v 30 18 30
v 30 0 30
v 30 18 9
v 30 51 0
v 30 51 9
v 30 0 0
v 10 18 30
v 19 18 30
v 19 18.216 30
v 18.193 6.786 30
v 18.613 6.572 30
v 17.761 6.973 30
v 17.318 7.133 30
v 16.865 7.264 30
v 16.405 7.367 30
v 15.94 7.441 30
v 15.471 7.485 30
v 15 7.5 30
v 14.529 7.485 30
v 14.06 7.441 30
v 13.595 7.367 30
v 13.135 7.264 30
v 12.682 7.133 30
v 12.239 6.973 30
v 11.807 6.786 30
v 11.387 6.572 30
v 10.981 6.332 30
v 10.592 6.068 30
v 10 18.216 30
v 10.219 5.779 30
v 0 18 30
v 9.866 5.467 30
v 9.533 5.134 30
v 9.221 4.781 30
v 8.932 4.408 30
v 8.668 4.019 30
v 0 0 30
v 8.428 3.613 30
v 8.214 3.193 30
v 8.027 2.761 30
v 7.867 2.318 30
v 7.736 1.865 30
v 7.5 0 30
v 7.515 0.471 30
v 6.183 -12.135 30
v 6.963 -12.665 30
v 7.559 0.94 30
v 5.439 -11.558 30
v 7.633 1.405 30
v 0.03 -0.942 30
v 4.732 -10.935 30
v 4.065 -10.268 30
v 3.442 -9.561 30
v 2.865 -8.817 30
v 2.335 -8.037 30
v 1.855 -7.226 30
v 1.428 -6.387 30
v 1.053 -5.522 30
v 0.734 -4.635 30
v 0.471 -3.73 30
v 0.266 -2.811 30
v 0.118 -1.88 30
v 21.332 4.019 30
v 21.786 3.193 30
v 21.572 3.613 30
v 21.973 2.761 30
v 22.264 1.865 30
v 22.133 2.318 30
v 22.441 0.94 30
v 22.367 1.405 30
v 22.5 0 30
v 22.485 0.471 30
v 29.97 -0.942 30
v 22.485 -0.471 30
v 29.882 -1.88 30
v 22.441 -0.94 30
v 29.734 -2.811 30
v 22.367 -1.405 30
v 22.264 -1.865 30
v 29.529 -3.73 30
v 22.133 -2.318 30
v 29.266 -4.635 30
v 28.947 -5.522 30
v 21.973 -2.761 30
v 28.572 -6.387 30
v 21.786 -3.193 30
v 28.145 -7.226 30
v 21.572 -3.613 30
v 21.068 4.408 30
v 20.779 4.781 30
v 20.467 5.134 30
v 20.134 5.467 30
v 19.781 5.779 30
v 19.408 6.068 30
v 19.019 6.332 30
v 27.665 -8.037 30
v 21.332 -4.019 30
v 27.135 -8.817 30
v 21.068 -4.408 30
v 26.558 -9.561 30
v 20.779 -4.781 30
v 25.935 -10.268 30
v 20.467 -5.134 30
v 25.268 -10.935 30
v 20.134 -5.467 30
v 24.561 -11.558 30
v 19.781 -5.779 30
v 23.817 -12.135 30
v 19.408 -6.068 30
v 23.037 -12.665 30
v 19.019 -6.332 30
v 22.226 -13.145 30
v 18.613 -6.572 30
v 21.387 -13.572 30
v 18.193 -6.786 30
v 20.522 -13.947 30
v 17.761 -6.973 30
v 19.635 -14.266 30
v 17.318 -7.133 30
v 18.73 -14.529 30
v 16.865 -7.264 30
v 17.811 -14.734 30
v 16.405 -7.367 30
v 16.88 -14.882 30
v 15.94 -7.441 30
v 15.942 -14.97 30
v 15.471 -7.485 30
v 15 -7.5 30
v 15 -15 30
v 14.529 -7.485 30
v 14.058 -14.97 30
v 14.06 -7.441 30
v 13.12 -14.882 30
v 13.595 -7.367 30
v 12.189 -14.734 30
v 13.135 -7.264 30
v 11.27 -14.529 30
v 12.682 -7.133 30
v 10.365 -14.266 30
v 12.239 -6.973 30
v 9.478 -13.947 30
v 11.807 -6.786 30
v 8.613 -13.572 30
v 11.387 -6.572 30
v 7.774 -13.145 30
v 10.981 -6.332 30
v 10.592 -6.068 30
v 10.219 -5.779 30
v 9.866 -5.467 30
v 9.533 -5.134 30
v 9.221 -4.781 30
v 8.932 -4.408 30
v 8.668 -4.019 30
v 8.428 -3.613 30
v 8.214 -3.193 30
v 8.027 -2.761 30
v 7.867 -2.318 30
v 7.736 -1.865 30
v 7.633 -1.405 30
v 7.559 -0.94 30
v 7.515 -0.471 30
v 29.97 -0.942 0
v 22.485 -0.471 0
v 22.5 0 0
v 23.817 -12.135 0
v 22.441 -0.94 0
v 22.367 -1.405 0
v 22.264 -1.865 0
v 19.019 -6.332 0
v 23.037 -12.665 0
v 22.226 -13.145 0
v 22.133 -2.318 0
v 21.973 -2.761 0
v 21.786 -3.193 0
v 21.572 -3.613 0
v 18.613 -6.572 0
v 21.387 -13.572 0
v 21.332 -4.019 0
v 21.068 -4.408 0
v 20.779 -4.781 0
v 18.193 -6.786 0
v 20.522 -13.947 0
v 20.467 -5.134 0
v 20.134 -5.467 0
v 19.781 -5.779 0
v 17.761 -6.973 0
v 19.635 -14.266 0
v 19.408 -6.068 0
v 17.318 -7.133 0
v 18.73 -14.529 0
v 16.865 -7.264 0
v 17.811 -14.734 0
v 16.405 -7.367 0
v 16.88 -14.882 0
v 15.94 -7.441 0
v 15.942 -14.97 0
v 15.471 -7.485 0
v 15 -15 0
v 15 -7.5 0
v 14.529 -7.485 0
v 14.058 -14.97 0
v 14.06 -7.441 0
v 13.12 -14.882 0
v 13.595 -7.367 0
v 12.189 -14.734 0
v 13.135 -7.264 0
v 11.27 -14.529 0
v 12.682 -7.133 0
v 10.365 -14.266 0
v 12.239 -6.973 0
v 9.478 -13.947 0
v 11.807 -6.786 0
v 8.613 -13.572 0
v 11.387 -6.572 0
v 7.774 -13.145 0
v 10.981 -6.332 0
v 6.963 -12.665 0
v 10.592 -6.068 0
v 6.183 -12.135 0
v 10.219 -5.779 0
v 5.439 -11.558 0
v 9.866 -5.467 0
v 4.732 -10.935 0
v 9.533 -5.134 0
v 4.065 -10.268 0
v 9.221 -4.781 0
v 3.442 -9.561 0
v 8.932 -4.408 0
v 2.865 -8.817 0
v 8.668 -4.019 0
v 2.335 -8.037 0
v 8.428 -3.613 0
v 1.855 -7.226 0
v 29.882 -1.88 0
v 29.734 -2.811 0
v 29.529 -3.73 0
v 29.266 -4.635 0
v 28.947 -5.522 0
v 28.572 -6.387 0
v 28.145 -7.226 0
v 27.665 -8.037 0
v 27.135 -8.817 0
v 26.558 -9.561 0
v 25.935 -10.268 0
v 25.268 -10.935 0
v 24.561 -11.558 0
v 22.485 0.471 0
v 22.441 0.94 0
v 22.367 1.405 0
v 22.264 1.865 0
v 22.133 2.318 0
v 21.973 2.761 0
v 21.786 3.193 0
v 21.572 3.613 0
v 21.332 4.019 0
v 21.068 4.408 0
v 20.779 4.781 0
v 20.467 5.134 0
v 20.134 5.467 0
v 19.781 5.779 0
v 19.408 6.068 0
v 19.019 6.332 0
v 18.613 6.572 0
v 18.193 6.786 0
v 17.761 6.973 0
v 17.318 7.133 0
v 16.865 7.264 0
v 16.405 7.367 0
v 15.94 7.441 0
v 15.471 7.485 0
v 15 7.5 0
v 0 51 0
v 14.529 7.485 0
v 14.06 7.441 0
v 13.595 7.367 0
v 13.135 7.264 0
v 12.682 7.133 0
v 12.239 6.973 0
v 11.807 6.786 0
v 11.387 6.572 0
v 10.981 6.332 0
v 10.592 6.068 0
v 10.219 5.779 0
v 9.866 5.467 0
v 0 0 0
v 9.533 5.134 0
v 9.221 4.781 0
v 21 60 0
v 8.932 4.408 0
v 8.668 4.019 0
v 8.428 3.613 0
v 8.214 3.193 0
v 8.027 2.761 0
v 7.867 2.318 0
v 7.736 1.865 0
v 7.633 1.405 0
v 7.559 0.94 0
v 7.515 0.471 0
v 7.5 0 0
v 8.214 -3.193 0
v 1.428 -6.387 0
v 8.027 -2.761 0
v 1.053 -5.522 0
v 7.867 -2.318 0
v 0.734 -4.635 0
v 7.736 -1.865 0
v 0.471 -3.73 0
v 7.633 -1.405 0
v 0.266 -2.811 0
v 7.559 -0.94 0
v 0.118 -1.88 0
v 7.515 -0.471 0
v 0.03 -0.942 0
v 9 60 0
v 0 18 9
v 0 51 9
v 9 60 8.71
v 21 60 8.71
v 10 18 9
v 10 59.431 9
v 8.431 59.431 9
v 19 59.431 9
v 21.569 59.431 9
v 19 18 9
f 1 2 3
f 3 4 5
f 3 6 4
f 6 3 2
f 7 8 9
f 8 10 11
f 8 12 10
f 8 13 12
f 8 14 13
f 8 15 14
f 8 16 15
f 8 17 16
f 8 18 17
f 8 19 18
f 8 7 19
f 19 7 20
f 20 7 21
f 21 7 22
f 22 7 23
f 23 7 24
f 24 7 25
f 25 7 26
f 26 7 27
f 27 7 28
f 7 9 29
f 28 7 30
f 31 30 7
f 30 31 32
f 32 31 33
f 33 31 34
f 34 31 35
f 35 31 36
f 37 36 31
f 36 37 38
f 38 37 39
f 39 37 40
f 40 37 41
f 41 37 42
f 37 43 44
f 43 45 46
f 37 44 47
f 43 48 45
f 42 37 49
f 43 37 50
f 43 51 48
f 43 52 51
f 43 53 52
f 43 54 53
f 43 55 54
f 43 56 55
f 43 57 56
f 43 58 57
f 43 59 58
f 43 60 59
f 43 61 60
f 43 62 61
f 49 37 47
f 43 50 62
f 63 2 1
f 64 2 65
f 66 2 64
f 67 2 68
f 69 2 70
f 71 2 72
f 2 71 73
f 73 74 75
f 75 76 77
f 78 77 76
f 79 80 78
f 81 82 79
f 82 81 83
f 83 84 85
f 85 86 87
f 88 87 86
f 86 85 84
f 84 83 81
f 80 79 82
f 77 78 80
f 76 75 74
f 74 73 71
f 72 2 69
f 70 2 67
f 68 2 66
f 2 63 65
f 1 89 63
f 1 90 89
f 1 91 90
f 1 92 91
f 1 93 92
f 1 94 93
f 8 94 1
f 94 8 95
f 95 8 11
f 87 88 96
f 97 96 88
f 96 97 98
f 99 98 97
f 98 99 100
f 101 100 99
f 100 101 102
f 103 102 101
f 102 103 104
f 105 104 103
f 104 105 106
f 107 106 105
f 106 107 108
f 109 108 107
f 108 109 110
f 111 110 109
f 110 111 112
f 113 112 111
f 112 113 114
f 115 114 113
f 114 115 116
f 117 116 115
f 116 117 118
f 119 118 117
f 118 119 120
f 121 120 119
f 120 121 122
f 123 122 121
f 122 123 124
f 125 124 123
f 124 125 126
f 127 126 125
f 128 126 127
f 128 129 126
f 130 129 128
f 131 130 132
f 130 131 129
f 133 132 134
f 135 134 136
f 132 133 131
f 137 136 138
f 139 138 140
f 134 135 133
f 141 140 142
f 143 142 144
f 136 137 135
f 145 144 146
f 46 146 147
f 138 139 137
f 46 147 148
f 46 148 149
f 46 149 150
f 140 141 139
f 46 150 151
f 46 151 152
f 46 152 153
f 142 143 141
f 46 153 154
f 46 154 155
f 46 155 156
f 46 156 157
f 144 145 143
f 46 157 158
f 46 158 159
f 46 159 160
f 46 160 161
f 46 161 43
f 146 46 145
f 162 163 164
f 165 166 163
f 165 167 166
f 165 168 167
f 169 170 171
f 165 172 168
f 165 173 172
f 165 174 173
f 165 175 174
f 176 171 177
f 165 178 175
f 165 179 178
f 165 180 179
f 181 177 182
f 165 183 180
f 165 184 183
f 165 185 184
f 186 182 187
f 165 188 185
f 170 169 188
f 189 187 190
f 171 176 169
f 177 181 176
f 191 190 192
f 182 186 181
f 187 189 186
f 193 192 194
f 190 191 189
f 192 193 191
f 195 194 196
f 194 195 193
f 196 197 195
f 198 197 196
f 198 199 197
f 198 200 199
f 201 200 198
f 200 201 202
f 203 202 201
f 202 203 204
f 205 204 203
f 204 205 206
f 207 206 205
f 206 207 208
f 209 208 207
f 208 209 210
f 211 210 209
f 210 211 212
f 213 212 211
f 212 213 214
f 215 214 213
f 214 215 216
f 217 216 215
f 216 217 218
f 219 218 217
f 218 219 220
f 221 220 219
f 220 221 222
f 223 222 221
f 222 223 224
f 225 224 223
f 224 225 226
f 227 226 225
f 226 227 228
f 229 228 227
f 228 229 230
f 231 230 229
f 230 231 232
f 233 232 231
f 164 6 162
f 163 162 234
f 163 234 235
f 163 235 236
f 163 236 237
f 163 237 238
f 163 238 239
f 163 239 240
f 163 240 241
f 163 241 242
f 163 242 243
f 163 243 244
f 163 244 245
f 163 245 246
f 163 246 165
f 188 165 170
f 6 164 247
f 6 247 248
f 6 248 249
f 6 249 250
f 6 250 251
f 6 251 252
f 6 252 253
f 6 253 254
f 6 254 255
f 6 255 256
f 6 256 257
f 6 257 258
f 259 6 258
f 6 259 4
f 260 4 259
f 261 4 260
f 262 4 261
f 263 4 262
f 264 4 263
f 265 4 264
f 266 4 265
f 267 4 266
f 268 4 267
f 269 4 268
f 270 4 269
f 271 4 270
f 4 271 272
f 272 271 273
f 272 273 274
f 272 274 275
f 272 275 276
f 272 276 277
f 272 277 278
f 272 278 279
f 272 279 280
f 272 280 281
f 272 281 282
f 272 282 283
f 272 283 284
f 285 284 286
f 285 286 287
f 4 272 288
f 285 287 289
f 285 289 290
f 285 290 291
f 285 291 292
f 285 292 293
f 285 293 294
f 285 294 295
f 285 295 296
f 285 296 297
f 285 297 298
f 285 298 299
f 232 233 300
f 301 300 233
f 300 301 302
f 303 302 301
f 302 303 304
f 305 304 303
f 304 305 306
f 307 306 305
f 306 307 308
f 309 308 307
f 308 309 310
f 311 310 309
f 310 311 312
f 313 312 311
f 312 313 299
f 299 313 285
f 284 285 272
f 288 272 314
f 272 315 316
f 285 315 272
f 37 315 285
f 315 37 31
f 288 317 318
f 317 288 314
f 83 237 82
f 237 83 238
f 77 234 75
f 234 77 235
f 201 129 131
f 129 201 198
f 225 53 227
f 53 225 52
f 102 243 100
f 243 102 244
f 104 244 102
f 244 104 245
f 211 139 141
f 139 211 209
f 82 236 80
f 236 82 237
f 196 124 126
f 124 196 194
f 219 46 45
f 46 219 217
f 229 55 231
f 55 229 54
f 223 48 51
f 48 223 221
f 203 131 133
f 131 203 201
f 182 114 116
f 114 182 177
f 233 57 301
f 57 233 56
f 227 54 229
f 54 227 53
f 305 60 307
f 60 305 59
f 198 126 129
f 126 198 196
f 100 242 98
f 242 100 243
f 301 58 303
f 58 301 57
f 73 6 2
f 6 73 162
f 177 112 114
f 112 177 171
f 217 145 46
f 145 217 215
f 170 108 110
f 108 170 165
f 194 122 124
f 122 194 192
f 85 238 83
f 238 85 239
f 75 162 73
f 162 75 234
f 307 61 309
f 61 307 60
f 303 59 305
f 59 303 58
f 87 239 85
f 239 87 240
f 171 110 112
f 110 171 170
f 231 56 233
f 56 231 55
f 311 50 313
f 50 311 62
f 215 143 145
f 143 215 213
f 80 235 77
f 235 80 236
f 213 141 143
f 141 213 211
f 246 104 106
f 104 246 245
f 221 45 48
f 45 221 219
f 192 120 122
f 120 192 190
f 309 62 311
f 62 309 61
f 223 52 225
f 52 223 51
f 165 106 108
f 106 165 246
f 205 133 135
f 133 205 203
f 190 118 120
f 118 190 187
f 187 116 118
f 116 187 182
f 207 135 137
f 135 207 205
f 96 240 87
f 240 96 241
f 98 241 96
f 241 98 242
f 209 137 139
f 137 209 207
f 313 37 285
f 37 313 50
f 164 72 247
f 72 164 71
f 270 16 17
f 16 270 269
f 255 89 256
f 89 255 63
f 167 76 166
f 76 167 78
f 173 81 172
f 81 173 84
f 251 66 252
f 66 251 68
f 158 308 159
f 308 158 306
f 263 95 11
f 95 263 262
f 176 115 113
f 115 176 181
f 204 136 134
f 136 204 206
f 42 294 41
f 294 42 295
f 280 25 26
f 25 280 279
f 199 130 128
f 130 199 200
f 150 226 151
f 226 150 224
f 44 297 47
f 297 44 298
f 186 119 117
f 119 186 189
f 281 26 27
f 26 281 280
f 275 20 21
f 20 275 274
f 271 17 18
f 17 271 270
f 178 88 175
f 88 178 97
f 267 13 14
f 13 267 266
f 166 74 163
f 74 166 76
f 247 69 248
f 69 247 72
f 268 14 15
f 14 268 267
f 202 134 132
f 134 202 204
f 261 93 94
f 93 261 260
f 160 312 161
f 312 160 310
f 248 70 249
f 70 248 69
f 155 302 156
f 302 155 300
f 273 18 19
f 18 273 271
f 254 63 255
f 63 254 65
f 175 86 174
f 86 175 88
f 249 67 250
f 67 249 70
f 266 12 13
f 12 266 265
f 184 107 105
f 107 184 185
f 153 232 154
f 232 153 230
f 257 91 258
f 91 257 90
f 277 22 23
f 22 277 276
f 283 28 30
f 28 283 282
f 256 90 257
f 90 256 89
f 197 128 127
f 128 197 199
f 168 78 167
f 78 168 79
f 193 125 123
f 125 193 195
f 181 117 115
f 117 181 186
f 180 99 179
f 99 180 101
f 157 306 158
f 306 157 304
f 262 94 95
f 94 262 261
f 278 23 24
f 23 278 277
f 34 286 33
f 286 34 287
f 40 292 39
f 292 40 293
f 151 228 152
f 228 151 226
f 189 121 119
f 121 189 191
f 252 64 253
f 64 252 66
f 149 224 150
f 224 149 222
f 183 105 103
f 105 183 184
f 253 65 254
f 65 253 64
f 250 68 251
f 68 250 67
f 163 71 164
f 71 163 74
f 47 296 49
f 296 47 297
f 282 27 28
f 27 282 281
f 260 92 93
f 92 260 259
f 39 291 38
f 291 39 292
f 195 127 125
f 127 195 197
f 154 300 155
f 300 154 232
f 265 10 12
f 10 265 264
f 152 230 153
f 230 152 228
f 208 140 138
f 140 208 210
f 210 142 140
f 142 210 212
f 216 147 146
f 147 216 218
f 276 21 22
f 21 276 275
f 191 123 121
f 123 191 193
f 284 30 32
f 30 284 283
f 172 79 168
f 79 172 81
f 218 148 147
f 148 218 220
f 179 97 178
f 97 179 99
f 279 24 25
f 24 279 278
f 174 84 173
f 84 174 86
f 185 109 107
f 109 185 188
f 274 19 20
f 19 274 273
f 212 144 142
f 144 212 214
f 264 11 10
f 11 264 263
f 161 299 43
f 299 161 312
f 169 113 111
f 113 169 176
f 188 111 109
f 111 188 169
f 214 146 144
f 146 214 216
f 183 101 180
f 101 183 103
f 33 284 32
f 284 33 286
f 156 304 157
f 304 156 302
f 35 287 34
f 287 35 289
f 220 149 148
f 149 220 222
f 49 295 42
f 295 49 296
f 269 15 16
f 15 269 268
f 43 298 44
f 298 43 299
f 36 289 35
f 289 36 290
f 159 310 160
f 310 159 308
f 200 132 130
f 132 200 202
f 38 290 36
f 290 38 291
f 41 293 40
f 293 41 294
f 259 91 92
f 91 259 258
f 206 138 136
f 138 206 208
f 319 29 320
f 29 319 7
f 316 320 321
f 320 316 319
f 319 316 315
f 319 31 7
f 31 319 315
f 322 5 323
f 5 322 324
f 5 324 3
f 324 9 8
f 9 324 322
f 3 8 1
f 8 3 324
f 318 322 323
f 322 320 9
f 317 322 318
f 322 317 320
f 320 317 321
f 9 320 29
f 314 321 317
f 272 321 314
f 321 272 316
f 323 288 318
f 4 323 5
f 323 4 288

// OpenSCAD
difference(){
union(){
difference(){
union(){
difference(){

difference(){
    union(){
difference(){
union(){
cube([30,60,30]);

translate([15,0,0])
    cylinder($fn=100,r=15, h=30);
}
translate([15,0,20])
    cylinder ($fn= 100, r=7.5, h=50, center=true);
}
}

}
union(){
translate([-2,18,9])
    cube([12,45,26]);

translate([19,18,9])
    cube([15,45,25]);
}
}
}
rotate([-27,0,0])
    translate([0,-5,35])
        cube([50,70,20]);
}    
}
union(){
    translate([0,51,-2])
        rotate([0,0,45])    
            cube([15,15,41]);

translate([30,51,-1])
    rotate([0,0,45])        
        cube([12,15,41]);
}
}
